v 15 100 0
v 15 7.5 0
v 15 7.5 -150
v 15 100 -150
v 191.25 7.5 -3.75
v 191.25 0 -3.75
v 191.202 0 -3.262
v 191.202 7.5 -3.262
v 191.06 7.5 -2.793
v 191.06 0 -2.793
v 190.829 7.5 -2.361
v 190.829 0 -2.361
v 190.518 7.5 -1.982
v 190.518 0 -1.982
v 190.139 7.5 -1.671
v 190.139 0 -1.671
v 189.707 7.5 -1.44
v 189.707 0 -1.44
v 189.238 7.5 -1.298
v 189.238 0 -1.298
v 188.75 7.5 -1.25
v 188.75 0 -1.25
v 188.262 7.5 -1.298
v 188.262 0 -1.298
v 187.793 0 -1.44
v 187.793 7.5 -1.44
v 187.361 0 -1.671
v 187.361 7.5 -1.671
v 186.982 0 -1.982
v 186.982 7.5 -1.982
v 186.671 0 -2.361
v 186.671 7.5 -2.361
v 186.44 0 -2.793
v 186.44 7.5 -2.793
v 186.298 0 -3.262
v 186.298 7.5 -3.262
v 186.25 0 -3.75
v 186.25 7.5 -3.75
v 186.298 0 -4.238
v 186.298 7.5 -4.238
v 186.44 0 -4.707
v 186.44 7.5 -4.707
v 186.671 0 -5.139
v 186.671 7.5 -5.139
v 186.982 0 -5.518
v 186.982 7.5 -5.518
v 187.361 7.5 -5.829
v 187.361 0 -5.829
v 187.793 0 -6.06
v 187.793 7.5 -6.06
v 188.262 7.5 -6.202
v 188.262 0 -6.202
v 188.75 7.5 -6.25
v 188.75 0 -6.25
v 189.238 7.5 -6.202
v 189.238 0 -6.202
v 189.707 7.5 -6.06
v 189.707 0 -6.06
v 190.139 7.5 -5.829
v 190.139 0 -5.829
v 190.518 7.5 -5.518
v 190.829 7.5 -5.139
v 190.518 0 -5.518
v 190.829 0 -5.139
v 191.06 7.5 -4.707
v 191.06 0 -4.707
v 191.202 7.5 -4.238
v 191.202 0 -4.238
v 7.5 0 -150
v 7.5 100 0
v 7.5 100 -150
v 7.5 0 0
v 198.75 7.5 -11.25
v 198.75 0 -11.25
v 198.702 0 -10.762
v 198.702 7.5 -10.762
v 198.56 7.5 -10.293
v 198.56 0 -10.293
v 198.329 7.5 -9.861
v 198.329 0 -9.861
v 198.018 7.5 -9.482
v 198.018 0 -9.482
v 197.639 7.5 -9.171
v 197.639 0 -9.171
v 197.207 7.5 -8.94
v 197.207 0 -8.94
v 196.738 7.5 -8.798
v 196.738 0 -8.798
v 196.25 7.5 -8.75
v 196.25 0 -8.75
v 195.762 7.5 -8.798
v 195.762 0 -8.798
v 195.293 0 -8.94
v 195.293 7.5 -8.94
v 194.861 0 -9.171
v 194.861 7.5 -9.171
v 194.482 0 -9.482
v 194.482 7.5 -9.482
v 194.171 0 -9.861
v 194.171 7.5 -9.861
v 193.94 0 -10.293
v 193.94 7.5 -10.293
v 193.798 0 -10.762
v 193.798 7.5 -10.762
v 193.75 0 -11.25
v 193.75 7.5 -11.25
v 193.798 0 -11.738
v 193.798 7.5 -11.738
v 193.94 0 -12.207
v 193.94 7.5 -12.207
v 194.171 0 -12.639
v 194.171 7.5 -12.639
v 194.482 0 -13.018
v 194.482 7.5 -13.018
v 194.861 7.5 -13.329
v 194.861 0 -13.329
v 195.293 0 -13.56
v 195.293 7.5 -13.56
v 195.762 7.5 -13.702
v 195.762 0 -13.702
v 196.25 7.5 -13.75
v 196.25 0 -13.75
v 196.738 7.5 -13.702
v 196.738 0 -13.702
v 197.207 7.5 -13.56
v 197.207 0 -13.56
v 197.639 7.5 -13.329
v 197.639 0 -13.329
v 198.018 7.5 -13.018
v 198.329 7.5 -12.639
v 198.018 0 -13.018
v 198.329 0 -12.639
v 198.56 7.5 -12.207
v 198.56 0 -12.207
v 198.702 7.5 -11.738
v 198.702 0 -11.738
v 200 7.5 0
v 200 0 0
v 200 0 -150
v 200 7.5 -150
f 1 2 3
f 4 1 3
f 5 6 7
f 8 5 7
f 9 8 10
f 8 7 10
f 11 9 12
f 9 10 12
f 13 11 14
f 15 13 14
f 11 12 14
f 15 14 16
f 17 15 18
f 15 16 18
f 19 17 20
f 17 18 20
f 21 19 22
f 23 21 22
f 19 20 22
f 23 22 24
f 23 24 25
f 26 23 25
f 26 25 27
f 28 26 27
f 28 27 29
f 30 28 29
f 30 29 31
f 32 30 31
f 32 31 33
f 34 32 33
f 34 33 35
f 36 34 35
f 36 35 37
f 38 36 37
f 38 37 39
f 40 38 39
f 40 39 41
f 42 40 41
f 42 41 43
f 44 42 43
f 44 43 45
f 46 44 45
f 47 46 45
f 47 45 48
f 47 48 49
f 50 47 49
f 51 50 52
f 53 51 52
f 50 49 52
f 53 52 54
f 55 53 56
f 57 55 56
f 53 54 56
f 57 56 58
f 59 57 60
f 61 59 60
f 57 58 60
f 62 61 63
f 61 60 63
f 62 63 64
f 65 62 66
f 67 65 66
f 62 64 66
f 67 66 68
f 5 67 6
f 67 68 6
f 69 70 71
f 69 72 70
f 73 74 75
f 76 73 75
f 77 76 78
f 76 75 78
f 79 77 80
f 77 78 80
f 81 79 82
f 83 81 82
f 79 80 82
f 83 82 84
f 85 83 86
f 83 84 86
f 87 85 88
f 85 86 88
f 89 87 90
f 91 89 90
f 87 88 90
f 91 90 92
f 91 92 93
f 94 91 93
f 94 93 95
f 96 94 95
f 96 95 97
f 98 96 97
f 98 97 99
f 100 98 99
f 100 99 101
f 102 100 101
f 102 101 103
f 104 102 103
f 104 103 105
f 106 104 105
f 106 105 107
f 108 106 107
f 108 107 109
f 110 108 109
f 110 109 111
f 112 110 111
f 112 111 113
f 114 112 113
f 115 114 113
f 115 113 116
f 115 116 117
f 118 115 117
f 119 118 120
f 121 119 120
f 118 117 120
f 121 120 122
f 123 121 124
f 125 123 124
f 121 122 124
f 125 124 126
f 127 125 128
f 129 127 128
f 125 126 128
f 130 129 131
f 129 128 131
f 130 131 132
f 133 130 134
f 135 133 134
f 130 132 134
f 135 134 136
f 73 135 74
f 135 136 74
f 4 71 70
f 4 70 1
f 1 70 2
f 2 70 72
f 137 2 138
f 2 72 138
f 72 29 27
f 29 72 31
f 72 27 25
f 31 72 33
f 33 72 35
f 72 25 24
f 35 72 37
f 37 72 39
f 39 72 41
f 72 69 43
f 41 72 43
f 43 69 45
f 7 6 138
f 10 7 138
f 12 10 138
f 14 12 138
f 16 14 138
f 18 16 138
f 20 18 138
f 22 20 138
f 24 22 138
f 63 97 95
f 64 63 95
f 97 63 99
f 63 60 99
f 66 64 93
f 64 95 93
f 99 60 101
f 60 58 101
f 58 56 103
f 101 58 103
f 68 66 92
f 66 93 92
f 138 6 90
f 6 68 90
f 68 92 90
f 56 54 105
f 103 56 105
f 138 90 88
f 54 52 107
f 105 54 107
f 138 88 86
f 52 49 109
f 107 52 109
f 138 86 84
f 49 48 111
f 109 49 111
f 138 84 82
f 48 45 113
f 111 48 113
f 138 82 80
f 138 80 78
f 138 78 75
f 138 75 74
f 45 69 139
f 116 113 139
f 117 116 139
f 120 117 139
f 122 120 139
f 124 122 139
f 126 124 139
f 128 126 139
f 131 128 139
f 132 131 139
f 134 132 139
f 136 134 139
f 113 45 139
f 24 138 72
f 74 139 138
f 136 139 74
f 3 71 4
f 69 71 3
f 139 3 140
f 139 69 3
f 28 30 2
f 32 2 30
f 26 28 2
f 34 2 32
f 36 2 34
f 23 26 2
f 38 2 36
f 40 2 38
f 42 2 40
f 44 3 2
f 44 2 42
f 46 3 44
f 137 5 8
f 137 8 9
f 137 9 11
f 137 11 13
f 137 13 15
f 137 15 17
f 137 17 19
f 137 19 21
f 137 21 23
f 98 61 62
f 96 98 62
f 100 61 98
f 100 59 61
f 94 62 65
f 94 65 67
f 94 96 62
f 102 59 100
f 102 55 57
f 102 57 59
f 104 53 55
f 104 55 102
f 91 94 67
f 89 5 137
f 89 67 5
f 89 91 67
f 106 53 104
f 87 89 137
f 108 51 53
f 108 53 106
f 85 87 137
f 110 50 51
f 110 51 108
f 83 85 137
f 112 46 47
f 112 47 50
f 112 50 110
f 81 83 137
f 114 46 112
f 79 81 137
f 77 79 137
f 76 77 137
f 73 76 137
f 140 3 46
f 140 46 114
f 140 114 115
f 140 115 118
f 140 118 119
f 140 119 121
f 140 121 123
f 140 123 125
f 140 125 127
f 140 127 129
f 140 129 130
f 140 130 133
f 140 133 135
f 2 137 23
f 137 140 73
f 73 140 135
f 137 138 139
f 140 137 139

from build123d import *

# Parameters (mm, degrees)
SKETCH1_W           = 192.5
SKETCH1_H           = 150
BOSS_EXTRUDE1_DEPTH = 7.5
SKETCH2_W           = 7.5
SKETCH2_H           = 150
BOSS_EXTRUDE2_DEPTH = 92.5
SKETCH3_R           = 2.5
CUT_EXTRUDE1_DEPTH  = 92.5


with BuildPart() as part:
    # Sketch1 → Boss-Extrude1 (new body)
    with BuildSketch(Plane(origin=(0, 0, 0), x_dir=(1, 0, 0), z_dir=(0, 1, 0))):
        with Locations((103.75, 75)):
            Rectangle(SKETCH1_W, SKETCH1_H)
    extrude(amount=BOSS_EXTRUDE1_DEPTH)

    # Sketch2 → Boss-Extrude2 (add)
    with BuildSketch(Plane(origin=(0, 7.5, 0), x_dir=(1, 0, 0), z_dir=(0, 1, 0))):
        with Locations((11.25, 75)):
            Rectangle(SKETCH2_W, SKETCH2_H)
    extrude(amount=BOSS_EXTRUDE2_DEPTH)

    # Sketch3 → Cut-Extrude1 (cut)
    with BuildSketch(Plane.XZ):
        with Locations((188.75, -3.75)):
            Circle(SKETCH3_R)
        with Locations((196.25, -11.25)):
            Circle(SKETCH3_R)
    extrude(amount=-CUT_EXTRUDE1_DEPTH, mode=Mode.SUBTRACT)


solid = part.part
